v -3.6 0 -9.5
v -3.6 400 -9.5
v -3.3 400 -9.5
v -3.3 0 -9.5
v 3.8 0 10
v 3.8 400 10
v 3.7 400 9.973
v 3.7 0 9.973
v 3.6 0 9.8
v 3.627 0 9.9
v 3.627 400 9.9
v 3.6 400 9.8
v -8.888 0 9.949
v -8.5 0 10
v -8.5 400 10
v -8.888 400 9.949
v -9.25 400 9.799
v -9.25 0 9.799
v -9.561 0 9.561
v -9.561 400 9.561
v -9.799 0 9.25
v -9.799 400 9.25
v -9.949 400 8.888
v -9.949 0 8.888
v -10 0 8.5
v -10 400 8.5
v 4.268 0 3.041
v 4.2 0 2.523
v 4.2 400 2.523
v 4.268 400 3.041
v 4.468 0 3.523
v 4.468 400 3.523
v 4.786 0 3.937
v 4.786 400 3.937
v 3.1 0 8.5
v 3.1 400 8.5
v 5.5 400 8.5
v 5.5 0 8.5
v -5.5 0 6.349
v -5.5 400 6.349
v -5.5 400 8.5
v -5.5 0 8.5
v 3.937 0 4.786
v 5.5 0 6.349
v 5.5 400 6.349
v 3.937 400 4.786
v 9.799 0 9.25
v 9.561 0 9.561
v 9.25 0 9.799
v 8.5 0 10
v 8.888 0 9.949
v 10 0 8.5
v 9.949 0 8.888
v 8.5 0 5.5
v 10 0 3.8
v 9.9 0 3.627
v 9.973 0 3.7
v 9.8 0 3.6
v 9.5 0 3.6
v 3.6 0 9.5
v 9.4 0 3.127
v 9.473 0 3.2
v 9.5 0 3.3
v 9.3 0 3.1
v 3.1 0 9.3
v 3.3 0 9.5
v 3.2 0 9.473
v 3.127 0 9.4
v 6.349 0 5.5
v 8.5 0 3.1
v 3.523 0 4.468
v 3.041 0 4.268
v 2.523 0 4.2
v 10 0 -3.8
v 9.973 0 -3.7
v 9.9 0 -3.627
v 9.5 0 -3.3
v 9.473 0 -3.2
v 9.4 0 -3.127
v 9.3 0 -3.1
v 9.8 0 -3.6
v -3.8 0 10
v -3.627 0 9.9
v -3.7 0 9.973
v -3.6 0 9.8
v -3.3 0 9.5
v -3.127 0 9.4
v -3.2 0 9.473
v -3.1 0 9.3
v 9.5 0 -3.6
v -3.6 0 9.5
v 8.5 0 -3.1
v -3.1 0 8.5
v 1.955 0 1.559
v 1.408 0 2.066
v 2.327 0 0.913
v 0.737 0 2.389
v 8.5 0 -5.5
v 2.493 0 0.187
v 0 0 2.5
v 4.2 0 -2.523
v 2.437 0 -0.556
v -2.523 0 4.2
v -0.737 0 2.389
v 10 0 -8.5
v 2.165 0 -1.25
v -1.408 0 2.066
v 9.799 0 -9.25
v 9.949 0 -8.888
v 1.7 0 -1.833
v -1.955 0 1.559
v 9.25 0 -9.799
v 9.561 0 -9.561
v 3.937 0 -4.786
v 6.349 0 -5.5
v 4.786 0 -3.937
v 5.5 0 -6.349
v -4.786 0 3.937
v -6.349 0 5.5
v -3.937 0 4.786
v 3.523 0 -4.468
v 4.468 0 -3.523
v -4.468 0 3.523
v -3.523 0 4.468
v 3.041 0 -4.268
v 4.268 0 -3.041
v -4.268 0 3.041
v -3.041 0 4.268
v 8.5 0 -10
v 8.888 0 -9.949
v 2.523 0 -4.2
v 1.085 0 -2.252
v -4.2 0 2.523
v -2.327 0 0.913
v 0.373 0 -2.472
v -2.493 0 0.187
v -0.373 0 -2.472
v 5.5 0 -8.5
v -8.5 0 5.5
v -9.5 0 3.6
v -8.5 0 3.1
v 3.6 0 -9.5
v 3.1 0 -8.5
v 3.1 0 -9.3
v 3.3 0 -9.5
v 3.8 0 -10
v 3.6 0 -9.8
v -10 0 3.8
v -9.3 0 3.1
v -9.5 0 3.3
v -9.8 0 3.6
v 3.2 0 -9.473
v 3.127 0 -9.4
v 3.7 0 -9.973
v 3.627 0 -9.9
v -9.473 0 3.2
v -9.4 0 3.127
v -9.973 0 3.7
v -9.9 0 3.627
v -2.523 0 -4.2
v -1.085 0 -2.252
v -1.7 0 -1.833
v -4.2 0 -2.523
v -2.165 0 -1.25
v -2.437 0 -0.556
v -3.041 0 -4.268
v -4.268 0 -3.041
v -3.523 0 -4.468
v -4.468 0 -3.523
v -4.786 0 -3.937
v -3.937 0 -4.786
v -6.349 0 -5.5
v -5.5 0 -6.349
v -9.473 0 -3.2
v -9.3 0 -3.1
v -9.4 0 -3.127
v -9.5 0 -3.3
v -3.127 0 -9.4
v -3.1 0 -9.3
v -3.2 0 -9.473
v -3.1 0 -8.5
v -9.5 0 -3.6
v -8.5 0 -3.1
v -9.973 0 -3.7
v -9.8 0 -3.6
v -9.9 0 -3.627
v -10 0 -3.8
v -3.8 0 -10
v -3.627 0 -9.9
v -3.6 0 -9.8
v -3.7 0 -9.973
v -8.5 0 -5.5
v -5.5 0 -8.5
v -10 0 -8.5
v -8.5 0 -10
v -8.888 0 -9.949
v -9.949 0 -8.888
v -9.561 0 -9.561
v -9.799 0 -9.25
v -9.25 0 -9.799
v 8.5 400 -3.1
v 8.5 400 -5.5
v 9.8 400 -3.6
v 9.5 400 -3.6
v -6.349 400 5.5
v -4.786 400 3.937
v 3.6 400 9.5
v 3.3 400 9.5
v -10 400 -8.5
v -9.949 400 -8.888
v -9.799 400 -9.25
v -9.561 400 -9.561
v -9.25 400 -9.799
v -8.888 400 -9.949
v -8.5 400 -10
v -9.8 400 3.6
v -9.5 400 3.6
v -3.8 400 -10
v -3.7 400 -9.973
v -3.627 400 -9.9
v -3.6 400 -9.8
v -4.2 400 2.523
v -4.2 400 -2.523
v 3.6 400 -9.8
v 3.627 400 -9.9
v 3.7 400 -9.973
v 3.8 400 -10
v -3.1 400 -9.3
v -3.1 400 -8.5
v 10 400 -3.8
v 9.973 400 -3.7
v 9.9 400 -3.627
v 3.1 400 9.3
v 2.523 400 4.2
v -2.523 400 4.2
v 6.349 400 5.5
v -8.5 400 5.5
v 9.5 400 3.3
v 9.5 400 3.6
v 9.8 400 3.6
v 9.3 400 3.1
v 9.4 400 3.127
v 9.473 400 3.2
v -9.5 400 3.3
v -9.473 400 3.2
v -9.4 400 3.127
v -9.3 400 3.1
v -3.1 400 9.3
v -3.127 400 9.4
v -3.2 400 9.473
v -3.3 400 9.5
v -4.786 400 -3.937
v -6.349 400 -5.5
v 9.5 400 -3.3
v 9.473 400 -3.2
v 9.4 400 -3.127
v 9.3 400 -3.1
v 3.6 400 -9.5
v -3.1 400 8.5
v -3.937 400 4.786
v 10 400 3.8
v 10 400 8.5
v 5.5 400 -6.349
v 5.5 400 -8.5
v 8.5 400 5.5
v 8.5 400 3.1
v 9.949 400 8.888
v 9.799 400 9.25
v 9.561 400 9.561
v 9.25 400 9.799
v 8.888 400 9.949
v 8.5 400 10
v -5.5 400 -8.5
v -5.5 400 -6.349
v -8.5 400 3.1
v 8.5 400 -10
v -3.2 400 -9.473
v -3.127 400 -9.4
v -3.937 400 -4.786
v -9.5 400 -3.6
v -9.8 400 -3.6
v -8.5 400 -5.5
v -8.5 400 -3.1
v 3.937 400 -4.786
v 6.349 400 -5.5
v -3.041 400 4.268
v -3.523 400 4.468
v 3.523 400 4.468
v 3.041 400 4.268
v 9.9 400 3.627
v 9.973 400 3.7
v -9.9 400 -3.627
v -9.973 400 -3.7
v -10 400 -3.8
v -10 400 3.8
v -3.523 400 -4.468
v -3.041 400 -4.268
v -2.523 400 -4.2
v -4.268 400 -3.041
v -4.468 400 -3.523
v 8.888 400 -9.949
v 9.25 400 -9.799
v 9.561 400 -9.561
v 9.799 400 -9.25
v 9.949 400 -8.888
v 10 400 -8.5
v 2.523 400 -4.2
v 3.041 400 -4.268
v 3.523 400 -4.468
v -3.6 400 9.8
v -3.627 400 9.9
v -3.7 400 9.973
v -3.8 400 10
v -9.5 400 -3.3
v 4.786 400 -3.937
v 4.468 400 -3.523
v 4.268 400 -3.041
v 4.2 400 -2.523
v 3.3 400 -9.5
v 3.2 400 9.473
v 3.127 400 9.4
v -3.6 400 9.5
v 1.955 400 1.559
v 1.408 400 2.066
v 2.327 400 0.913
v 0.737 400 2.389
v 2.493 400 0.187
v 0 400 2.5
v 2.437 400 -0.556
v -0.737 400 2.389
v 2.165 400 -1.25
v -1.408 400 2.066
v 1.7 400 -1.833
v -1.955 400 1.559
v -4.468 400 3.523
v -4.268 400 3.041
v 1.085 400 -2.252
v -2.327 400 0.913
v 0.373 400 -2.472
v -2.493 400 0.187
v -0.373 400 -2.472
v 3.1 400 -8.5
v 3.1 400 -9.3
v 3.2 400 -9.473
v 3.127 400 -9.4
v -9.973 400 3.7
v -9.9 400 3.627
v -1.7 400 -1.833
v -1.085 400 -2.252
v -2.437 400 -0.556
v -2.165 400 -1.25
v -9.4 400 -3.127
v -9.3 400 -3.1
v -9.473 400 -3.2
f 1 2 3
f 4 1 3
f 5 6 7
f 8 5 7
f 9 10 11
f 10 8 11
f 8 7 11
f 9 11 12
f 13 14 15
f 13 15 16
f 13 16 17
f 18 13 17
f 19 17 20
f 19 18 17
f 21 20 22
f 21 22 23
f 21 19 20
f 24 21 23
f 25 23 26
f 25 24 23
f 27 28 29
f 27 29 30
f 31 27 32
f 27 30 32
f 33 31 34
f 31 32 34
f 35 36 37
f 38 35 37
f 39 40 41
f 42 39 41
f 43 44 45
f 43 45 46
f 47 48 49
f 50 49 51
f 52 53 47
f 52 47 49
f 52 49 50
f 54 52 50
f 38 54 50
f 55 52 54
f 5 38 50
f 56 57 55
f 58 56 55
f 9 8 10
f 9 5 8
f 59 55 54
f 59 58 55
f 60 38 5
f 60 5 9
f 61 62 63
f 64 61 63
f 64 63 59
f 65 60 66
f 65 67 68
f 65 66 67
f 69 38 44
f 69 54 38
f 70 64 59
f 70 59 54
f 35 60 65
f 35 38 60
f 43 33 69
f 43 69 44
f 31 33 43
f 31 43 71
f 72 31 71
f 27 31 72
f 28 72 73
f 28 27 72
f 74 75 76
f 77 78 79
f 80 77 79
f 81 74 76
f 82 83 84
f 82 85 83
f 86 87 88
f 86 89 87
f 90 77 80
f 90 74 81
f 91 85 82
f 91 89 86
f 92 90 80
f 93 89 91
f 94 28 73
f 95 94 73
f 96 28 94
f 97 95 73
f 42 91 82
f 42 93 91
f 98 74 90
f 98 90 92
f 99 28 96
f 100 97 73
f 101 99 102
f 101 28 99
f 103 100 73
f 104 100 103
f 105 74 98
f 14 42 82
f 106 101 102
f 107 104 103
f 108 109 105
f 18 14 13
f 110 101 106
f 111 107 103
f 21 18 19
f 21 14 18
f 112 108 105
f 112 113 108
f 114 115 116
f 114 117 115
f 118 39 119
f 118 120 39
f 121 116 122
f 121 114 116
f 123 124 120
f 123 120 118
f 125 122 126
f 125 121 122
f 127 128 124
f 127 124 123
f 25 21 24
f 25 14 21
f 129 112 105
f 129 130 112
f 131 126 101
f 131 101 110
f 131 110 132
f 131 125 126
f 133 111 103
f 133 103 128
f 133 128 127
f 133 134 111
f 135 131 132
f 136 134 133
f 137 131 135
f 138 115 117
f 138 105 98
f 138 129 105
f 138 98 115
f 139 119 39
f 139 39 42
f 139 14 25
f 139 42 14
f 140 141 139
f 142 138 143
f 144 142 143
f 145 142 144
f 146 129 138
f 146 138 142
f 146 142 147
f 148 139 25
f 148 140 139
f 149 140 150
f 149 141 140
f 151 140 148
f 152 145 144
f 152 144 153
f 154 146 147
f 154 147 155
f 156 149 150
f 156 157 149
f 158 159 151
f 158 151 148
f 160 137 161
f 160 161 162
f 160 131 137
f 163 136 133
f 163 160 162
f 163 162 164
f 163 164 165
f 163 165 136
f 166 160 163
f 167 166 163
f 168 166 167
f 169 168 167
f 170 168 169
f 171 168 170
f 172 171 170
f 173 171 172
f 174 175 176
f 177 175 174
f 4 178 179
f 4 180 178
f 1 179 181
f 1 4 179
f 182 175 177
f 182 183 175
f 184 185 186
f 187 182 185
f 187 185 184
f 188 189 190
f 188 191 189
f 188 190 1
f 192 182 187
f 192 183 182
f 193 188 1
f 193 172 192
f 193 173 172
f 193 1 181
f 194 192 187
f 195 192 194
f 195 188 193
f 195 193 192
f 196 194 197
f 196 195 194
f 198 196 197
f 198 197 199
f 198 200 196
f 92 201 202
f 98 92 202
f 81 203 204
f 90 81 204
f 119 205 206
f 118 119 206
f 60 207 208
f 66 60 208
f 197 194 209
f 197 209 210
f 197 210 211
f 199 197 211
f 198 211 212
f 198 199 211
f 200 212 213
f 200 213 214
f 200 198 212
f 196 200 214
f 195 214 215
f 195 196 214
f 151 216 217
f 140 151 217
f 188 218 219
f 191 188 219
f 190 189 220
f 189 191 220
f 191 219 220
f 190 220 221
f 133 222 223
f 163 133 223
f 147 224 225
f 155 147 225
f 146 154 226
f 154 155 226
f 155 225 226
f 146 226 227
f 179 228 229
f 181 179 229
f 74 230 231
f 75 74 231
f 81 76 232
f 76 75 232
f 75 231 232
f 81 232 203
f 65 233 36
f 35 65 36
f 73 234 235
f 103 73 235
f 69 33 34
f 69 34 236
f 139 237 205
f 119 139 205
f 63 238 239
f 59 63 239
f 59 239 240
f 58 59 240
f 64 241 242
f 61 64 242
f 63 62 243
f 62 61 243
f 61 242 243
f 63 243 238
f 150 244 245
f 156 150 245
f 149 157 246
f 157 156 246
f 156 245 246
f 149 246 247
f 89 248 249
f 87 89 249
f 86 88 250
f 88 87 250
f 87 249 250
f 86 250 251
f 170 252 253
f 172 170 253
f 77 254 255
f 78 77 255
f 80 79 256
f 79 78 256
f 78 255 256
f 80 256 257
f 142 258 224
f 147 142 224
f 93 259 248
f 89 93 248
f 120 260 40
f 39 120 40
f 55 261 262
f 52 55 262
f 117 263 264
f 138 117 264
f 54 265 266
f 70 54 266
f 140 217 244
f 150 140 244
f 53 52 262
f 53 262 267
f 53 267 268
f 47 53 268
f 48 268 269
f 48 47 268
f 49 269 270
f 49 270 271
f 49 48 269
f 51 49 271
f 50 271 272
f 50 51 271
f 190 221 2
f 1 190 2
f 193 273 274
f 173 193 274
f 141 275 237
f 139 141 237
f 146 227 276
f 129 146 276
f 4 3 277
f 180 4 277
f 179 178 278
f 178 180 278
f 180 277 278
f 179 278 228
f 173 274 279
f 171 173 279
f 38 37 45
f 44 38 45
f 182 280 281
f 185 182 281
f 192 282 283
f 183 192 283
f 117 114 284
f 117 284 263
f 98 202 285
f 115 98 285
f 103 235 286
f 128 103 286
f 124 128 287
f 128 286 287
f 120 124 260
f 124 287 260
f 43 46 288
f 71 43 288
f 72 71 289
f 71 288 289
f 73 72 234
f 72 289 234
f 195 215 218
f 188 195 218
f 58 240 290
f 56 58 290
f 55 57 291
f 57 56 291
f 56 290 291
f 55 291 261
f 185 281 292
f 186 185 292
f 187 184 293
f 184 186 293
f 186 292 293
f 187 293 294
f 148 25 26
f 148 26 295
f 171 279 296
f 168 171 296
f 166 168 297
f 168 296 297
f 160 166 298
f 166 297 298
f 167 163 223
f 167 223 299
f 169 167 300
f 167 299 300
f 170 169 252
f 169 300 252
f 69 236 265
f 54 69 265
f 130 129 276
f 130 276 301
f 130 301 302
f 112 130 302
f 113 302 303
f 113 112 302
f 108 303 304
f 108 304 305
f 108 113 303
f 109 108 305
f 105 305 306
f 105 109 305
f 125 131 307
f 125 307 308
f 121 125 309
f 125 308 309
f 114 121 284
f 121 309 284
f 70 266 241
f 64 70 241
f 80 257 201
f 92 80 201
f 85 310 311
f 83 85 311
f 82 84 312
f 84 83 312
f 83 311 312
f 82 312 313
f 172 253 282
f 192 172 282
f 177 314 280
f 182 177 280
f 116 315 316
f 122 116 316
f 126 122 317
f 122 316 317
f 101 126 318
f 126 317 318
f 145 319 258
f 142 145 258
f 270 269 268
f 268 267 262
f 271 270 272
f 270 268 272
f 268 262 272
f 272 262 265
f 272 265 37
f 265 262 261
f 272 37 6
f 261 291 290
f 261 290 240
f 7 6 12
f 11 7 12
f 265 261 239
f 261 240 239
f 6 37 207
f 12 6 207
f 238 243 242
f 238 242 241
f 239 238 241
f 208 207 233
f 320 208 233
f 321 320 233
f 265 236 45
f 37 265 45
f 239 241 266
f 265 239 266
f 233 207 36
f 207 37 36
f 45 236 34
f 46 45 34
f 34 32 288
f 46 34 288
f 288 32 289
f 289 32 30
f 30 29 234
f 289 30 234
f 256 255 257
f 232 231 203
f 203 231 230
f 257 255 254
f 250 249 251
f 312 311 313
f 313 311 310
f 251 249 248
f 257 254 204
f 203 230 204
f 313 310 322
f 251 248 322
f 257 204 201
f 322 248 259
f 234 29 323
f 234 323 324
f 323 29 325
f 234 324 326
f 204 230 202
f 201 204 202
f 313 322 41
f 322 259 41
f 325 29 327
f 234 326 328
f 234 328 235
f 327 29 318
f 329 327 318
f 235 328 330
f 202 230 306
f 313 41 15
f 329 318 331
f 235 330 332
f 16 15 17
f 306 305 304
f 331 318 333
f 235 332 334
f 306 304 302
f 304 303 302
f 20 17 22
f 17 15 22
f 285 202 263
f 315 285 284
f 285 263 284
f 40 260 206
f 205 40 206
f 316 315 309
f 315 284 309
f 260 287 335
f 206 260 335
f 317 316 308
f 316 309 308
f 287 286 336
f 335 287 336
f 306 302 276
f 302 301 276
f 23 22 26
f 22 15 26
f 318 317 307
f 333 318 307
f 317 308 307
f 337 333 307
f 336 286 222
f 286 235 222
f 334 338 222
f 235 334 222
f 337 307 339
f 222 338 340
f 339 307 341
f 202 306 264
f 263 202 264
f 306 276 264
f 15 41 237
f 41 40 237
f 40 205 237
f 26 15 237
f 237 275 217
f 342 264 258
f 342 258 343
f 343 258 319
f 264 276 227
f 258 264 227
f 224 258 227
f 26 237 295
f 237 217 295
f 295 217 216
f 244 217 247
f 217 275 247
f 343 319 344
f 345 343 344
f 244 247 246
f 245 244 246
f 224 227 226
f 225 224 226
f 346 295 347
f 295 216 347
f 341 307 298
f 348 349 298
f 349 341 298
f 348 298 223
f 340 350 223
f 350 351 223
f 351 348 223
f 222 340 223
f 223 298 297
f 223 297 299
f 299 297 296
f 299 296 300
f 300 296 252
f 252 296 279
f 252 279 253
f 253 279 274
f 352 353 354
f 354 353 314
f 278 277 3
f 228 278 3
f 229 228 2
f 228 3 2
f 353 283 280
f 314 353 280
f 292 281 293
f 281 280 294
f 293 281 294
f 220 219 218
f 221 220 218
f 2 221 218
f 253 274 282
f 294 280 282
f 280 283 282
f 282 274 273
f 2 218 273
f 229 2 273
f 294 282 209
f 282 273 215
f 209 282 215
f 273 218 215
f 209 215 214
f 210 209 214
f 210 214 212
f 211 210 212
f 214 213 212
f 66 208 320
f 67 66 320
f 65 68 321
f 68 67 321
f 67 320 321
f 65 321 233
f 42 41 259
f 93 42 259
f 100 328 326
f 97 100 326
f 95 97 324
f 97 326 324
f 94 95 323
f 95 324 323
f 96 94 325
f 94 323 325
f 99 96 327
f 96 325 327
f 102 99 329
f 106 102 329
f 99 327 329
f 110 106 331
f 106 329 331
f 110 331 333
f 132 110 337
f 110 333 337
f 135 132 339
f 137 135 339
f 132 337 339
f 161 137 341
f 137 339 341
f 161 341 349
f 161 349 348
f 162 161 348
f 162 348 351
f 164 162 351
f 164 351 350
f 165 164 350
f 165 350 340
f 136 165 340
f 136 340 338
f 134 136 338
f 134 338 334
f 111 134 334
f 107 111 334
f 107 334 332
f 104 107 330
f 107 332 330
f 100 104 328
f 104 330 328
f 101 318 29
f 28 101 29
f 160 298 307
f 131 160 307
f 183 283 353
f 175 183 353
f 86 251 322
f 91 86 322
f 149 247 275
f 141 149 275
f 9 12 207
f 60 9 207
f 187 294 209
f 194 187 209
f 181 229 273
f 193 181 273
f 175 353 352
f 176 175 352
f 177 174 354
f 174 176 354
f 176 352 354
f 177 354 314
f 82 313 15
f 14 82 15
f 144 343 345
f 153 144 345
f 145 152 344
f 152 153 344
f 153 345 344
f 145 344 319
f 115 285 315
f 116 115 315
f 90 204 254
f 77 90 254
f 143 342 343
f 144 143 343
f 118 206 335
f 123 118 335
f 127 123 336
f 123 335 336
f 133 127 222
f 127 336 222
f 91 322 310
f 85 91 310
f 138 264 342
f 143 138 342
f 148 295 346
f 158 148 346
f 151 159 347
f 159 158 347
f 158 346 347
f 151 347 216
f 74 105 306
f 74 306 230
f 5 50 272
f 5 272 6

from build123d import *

# Parameters (mm, degrees)
BOSS_EXTRUDE1_DEPTH = 400
SKETCH3_R           = 2.5
CUT_EXTRUDE1_DEPTH  = 401.249921924
CIRPATTERN1_COUNT   = 4


with BuildPart() as part:
    # Sketch2 → Boss-Extrude1 (new body)
    with BuildSketch(Plane(origin=(0, 0, 0), x_dir=(1, 0, 0), z_dir=(0, 1, 0))):
        with BuildLine():
            Line((-10, -8.5), (-10, 8.5))
            ThreePointArc((-10, 8.5), (-9.560660172, 9.560660172), (-8.5, 10))
            Line((-8.5, 10), (8.5, 10))
            ThreePointArc((8.5, 10), (9.560660172, 9.560660172), (10, 8.5))
            Line((10, 8.5), (10, -8.5))
            ThreePointArc((10, -8.5), (9.560660172, -9.560660172), (8.5, -10))
            Line((8.5, -10), (-8.5, -10))
            ThreePointArc((-8.5, -10), (-9.560660172, -9.560660172), (-10, -8.5))
        make_face()
    extrude(amount=BOSS_EXTRUDE1_DEPTH)

    # Sketch3 → Cut-Extrude1 (cut, through all)
    with BuildSketch(Plane(origin=(0, 400, 0), x_dir=(1, 0, 0), z_dir=(0, 1, 0))):
        Circle(SKETCH3_R)
        with BuildLine():
            Line((-8.5, -5.5), (-6.348528137, -5.5))
            Line((-6.348528137, -5.5), (-4.785786438, -3.9372583))
            ThreePointArc((-4.785786438, -3.9372583), (-4.352240935, -3.288411603), (-4.2, -2.523044738))
            Line((-4.2, -2.523044738), (-4.2, 2.523044738))
            ThreePointArc((-4.2, 2.523044738), (-4.352240935, 3.288411603), (-4.785786438, 3.9372583))
            Line((-4.785786438, 3.9372583), (-6.348528137, 5.5))
            Line((-6.348528137, 5.5), (-8.5, 5.5))
            Line((-8.5, 5.5), (-8.5, 3.1))
            Line((-8.5, 3.1), (-9.3, 3.1))
            ThreePointArc((-9.3, 3.1), (-9.441421356, 3.158578644), (-9.5, 3.3))
            Line((-9.5, 3.3), (-9.5, 3.6))
            Line((-9.5, 3.6), (-9.8, 3.6))
            ThreePointArc((-9.8, 3.6), (-9.941421356, 3.658578644), (-10, 3.8))
            Line((-10, 3.8), (-10, -3.8))
            ThreePointArc((-10, -3.8), (-9.941421356, -3.658578644), (-9.8, -3.6))
            Line((-9.8, -3.6), (-9.5, -3.6))
            Line((-9.5, -3.6), (-9.5, -3.3))
            ThreePointArc((-9.5, -3.3), (-9.441421356, -3.158578644), (-9.3, -3.1))
            Line((-9.3, -3.1), (-8.5, -3.1))
            Line((-8.5, -3.1), (-8.5, -5.5))
        make_face()
    cut_extrude1 = extrude(amount=-CUT_EXTRUDE1_DEPTH, mode=Mode.SUBTRACT)

    # CirPattern1: Cut-Extrude1 ×4 about axis
    cirpattern1_axis = Axis((0, -20, 0), (0, 1, 0))
    for i in range(1, CIRPATTERN1_COUNT):
        add(cut_extrude1.rotate(cirpattern1_axis, i * 360 / CIRPATTERN1_COUNT), mode=Mode.SUBTRACT)


solid = part.part
